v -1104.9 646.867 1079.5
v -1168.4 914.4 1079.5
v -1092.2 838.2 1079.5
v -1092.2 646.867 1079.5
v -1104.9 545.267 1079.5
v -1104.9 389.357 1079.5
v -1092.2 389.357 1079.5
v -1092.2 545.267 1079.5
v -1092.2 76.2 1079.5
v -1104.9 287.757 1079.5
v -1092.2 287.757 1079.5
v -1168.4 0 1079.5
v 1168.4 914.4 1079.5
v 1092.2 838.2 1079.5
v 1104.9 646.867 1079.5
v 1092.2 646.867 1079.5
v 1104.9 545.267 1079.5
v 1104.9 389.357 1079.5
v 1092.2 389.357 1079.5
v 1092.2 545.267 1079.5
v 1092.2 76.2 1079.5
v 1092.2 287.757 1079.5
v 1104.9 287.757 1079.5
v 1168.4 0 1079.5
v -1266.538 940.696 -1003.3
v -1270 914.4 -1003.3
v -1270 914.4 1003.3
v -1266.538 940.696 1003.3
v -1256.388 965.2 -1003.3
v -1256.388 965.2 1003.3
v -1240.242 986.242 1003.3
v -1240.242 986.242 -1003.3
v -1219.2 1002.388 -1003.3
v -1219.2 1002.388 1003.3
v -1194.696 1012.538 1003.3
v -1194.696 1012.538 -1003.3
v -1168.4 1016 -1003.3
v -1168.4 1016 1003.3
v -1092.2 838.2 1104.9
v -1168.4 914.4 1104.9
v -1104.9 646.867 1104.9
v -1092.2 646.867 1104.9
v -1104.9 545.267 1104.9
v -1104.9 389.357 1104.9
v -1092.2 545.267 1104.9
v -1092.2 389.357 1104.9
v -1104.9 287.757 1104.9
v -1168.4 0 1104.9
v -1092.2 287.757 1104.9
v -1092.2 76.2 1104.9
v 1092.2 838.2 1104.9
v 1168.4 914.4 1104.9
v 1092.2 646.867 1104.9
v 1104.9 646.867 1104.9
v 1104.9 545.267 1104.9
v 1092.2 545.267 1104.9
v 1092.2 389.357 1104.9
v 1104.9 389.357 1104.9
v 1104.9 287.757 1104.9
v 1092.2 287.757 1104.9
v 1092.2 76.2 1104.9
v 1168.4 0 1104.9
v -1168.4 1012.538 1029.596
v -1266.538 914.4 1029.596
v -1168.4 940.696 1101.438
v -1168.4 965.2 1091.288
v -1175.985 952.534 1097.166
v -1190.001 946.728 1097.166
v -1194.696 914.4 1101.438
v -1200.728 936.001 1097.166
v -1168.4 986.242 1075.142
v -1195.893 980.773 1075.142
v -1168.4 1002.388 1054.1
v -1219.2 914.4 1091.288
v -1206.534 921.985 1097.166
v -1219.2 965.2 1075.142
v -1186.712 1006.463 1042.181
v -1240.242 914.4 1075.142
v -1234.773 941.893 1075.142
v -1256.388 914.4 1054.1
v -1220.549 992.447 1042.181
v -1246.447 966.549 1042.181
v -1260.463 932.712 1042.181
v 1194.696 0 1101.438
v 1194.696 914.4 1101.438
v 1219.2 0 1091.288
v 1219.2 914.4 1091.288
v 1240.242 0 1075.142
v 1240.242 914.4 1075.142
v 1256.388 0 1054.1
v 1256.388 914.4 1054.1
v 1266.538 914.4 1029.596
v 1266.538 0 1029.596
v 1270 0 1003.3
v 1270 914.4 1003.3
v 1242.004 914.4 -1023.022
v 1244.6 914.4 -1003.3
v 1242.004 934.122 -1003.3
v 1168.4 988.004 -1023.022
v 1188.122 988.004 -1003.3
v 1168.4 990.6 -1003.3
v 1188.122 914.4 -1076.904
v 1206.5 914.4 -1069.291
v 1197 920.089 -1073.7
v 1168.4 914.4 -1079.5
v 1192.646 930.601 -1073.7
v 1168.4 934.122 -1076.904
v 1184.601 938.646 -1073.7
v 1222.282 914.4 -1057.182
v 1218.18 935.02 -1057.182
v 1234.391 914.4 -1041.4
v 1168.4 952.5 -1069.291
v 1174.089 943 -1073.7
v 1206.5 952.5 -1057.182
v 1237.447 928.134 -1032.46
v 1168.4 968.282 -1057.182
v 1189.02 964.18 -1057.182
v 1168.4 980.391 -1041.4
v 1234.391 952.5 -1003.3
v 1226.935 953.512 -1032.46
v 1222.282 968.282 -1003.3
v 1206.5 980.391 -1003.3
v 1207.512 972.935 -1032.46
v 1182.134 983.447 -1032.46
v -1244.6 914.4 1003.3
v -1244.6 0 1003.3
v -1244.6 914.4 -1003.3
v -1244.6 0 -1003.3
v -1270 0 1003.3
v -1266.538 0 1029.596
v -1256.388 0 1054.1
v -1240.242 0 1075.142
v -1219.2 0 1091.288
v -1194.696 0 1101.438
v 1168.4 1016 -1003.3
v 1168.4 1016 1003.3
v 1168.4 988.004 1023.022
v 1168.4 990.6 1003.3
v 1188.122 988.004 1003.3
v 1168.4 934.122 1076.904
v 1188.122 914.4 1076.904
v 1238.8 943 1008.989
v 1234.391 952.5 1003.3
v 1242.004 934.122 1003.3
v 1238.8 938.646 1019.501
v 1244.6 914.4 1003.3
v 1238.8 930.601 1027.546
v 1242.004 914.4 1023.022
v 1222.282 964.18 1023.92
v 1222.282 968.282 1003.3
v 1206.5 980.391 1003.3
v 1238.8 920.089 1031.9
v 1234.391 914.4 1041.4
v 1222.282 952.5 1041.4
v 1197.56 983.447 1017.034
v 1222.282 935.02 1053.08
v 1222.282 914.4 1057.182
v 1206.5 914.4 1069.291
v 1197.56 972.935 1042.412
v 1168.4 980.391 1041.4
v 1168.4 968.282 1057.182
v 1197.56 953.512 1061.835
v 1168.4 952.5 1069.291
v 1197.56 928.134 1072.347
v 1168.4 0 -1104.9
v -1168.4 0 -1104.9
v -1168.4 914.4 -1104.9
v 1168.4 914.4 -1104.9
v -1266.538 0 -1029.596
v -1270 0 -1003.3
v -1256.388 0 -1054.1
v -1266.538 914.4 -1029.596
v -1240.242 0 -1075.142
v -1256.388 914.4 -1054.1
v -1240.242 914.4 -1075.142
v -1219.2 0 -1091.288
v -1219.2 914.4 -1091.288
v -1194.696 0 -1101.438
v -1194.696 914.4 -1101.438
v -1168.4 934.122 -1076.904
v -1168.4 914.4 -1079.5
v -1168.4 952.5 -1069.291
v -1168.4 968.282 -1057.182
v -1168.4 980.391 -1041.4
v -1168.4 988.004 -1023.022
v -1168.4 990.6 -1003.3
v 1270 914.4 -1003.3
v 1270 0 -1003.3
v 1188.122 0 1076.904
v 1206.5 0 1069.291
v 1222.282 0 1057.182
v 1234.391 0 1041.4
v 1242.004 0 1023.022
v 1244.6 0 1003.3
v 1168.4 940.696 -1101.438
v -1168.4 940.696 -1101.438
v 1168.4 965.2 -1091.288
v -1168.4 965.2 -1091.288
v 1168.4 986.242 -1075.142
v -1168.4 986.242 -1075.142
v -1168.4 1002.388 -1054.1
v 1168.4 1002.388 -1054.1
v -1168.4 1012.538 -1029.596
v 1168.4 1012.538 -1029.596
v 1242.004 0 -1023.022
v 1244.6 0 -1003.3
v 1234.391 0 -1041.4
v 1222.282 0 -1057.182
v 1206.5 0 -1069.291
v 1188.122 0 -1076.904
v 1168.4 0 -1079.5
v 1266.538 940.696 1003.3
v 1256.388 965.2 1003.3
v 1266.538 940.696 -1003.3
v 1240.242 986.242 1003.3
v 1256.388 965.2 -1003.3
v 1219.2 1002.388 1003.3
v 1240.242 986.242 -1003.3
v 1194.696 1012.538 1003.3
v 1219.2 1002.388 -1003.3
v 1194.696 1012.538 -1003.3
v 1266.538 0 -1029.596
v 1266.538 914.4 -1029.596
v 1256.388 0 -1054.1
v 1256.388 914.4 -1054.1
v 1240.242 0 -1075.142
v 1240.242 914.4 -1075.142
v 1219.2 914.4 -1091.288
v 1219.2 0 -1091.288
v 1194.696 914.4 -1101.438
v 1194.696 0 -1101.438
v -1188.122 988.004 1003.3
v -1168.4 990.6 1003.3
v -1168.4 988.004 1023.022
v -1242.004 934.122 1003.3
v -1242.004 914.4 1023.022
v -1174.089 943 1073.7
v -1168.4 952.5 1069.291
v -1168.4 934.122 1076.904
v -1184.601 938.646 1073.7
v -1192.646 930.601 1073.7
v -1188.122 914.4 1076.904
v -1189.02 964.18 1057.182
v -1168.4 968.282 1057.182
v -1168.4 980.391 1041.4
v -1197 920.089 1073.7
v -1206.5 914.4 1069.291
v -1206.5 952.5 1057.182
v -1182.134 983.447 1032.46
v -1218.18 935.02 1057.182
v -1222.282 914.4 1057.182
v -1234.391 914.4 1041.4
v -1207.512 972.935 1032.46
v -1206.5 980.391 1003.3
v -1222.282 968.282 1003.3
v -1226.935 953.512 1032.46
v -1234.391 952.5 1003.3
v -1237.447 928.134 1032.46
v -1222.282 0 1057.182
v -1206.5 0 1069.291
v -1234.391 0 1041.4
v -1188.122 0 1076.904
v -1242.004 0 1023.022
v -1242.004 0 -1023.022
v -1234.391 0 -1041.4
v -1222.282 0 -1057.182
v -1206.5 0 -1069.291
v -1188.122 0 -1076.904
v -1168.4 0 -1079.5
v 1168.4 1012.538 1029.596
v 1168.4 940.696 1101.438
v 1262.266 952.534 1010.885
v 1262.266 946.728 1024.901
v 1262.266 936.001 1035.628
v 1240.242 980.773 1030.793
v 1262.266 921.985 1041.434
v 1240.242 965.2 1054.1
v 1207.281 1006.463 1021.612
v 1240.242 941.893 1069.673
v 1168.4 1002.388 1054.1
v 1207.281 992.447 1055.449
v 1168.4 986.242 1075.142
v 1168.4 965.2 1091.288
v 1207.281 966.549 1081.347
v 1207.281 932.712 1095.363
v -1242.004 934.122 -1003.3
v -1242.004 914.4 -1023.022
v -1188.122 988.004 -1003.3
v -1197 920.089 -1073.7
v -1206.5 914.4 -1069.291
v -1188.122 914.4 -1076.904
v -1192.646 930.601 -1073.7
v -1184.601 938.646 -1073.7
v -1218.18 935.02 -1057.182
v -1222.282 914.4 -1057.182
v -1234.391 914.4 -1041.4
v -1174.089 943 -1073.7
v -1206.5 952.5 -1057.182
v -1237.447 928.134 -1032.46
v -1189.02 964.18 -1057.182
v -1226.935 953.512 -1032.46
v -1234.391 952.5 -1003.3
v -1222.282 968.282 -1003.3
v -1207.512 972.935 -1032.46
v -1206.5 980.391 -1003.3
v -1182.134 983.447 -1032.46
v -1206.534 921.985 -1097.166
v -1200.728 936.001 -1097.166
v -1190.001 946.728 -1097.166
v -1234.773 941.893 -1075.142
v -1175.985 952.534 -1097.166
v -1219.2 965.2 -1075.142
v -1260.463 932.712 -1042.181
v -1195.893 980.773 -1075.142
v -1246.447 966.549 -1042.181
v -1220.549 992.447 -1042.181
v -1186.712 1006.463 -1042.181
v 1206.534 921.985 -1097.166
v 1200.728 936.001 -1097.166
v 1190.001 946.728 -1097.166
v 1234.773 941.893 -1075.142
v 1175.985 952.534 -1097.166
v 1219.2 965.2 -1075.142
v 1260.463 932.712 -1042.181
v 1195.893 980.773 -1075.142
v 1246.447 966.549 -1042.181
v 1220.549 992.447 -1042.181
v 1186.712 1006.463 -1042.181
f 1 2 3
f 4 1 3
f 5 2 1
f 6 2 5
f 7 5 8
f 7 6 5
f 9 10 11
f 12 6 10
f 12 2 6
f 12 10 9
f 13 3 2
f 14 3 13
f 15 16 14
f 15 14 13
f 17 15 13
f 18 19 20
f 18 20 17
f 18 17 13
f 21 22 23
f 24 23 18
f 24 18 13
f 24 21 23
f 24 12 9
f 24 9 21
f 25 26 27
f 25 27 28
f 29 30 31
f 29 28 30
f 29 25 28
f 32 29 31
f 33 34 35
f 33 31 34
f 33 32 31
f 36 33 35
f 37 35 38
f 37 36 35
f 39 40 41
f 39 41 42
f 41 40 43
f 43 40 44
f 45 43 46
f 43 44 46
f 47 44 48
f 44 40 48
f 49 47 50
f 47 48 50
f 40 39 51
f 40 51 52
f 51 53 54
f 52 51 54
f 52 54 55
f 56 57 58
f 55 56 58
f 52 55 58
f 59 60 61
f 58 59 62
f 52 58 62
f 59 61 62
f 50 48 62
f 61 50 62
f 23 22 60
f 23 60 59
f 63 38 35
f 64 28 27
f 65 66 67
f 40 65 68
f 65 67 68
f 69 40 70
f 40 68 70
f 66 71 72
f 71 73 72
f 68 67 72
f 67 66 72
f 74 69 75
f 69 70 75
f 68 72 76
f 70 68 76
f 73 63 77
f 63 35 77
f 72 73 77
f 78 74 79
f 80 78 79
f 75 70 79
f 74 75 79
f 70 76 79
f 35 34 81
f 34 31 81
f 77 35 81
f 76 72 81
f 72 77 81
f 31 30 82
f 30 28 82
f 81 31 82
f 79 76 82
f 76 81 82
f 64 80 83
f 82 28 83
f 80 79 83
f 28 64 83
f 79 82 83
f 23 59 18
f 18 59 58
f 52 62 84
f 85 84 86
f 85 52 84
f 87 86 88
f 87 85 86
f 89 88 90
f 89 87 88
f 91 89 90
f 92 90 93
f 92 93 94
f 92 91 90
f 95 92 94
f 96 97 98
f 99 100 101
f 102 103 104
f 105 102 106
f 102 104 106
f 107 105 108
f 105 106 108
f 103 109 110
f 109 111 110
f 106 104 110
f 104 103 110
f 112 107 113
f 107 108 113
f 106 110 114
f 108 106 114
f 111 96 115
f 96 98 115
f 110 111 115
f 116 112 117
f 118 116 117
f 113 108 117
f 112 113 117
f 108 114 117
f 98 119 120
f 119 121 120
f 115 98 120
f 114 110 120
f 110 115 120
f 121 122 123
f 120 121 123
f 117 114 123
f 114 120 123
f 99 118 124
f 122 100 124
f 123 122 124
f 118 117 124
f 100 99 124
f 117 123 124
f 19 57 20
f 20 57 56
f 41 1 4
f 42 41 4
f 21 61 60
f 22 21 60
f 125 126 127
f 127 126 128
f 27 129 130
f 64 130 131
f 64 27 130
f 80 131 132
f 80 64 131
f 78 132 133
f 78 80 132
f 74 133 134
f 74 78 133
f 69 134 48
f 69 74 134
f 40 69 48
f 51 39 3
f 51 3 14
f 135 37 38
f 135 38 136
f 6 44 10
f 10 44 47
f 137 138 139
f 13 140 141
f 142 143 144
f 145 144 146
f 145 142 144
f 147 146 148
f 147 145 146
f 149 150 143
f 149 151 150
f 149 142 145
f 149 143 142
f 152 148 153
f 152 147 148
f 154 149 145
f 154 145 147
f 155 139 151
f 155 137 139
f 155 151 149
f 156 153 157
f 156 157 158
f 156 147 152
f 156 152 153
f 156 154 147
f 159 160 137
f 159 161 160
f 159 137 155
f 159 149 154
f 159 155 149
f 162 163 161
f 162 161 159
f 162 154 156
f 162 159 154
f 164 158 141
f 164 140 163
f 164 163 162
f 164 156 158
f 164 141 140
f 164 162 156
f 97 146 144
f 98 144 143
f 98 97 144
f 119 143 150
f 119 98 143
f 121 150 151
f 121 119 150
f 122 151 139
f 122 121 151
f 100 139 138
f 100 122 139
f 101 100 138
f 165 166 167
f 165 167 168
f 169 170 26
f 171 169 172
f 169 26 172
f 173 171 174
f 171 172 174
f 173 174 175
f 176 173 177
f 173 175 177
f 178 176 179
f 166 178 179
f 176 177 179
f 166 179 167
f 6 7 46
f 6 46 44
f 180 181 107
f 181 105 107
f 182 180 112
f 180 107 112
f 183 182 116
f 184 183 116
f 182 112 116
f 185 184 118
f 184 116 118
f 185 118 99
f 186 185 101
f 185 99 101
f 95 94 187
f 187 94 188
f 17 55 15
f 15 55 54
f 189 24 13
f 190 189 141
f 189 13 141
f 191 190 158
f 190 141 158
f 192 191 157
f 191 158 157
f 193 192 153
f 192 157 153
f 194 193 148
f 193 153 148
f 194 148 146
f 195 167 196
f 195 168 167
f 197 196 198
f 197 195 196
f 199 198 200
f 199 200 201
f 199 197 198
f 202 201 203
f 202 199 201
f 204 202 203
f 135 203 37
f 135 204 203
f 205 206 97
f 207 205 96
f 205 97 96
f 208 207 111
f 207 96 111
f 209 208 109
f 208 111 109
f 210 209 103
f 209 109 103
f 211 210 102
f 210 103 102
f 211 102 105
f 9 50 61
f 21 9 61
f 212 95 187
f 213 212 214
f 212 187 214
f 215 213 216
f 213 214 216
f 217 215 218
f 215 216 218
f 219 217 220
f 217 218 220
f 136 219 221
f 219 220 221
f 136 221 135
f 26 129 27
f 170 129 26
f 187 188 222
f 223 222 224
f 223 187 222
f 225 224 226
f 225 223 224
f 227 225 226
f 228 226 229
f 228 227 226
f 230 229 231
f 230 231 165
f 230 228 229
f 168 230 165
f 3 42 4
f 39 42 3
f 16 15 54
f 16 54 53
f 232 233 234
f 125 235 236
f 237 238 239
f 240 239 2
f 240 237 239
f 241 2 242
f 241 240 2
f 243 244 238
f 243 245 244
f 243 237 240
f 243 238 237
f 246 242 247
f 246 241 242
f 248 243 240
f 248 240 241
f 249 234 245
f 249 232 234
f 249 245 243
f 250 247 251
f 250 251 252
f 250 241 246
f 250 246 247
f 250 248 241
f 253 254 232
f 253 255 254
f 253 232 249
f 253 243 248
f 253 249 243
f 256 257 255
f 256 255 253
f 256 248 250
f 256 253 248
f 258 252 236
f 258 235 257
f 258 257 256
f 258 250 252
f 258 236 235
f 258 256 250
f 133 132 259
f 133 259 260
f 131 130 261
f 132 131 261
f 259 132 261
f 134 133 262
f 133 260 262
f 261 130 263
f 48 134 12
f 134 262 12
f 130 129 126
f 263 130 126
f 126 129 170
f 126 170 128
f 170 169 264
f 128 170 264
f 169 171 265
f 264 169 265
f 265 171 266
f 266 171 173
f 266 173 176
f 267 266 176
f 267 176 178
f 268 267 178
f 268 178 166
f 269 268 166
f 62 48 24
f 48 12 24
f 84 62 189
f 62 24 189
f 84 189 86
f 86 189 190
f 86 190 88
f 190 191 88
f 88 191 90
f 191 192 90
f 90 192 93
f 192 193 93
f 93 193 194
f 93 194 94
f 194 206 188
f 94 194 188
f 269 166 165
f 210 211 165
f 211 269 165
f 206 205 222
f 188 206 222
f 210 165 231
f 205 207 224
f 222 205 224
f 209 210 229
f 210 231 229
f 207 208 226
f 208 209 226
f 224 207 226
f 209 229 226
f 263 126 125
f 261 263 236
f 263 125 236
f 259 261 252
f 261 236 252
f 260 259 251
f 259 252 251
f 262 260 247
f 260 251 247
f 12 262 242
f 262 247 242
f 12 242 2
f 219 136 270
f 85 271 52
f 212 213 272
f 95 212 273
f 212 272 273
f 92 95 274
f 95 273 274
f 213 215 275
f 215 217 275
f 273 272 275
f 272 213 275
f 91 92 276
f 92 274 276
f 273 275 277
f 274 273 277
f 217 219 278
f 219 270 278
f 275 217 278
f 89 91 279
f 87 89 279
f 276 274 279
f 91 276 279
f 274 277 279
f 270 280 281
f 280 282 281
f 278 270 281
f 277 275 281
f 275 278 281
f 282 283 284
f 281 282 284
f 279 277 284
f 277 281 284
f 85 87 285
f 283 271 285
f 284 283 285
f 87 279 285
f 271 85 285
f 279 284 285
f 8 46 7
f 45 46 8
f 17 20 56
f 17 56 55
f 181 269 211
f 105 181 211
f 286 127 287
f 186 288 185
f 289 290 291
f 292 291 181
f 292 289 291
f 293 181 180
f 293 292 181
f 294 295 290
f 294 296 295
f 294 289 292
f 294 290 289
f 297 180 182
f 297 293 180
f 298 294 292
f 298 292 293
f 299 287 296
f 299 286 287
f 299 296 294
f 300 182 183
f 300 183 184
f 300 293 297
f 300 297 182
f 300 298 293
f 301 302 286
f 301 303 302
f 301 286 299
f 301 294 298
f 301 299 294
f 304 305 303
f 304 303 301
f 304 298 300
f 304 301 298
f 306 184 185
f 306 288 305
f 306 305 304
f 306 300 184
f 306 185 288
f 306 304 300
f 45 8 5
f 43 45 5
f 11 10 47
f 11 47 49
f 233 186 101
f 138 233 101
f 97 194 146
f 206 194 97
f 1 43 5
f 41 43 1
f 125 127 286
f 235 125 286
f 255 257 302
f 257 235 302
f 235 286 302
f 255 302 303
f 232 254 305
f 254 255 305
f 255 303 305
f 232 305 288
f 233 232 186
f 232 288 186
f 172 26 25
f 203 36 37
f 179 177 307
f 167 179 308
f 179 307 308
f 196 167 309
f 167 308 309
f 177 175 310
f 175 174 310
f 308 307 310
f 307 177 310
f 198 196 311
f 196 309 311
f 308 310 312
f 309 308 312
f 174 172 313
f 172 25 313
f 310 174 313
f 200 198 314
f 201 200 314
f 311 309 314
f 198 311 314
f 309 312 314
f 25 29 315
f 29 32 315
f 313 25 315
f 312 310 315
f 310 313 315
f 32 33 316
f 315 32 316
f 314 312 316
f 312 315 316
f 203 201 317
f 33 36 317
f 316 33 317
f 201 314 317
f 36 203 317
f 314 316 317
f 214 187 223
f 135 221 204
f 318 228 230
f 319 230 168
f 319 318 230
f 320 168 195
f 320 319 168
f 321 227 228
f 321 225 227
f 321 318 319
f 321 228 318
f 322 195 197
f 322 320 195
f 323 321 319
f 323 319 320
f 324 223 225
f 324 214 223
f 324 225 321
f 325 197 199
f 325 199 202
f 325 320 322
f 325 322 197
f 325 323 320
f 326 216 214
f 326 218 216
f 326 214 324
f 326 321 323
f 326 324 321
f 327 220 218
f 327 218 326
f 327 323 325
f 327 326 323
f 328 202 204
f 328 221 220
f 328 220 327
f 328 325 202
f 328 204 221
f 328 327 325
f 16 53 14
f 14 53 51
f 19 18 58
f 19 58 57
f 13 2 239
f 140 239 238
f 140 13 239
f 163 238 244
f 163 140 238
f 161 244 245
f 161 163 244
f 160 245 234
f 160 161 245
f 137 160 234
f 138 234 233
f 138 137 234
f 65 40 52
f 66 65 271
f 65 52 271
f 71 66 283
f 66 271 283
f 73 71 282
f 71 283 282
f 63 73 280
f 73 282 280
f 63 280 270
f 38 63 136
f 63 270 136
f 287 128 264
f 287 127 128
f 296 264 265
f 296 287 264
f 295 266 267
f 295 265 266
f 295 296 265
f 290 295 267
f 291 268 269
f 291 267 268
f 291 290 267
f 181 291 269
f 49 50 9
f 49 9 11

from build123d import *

# Parameters (mm, degrees)
SKETCH1_W           = 2540
SKETCH1_H           = 2209.8
BOSS_EXTRUDE1_DEPTH = 1016
FILLET1_R           = 101.6
SHELL1_T            = -25.4
SKETCH2_W           = 2184.4
SKETCH2_H           = 762
CUT_EXTRUDE1_DEPTH  = 101.6
CUT_EXTRUDE2_DEPTH  = 25.4


with BuildPart() as part:
    # Sketch1 → Boss-Extrude1 (new body)
    with BuildSketch(Plane(origin=(0, 0, 0), x_dir=(1, 0, 0), z_dir=(0, 1, 0))):
        Rectangle(SKETCH1_W, SKETCH1_H)
    extrude(amount=BOSS_EXTRUDE1_DEPTH)

    # Fillet1
    fillet1_edges = [part.edges().sort_by_distance(p)[0] for p in [
        (-1270, 1016, 0),
        (0, 1016, 1104.9),
        (1270, 1016, 0),
        (1270, 508, 1104.9),
        (-1270, 508, 1104.9),
        (-1270, 508, -1104.9),
        (1270, 508, -1104.9),
        (0, 1016, -1104.9),
    ]]
    fillet(fillet1_edges, radius=FILLET1_R)

    # Shell1
    shell1_openings = [part.faces().sort_by_distance(p)[0] for p in [
        (0, 0, 0),
    ]]
    offset(amount=SHELL1_T, openings=shell1_openings, kind=Kind.INTERSECTION)

    # Sketch2 → Cut-Extrude1 (cut)
    with BuildSketch(Plane.XY.offset(1104.9)):
        with Locations((0, 457.2)):
            Rectangle(SKETCH2_W, SKETCH2_H)
    extrude(amount=-CUT_EXTRUDE1_DEPTH, mode=Mode.SUBTRACT)

    # Sketch4 → Cut-Extrude2 (cut)
    with BuildSketch(Plane.XY.offset(1104.9)):
        Polygon((-1092.2, 338.556587626), (-1092.2, 389.356587626), (-1104.9, 389.356587626), (-1104.9, 287.756587626), (-1092.2, 287.756587626), align=None)
        Polygon((1104.9, 646.867286995), (1092.2, 646.867286995), (1092.2, 596.067286995), (1092.2, 545.267286995), (1104.9, 545.267286995), align=None)
        Polygon((1104.9, 389.356587626), (1092.2, 389.356587626), (1092.2, 338.556587626), (1092.2, 287.756587626), (1104.9, 287.756587626), align=None)
        Polygon((-1092.2, 596.067286995), (-1092.2, 545.267286995), (-1104.9, 545.267286995), (-1104.9, 646.867286995), (-1092.2, 646.867286995), align=None)
    extrude(amount=-CUT_EXTRUDE2_DEPTH, mode=Mode.SUBTRACT)


solid = part.part
